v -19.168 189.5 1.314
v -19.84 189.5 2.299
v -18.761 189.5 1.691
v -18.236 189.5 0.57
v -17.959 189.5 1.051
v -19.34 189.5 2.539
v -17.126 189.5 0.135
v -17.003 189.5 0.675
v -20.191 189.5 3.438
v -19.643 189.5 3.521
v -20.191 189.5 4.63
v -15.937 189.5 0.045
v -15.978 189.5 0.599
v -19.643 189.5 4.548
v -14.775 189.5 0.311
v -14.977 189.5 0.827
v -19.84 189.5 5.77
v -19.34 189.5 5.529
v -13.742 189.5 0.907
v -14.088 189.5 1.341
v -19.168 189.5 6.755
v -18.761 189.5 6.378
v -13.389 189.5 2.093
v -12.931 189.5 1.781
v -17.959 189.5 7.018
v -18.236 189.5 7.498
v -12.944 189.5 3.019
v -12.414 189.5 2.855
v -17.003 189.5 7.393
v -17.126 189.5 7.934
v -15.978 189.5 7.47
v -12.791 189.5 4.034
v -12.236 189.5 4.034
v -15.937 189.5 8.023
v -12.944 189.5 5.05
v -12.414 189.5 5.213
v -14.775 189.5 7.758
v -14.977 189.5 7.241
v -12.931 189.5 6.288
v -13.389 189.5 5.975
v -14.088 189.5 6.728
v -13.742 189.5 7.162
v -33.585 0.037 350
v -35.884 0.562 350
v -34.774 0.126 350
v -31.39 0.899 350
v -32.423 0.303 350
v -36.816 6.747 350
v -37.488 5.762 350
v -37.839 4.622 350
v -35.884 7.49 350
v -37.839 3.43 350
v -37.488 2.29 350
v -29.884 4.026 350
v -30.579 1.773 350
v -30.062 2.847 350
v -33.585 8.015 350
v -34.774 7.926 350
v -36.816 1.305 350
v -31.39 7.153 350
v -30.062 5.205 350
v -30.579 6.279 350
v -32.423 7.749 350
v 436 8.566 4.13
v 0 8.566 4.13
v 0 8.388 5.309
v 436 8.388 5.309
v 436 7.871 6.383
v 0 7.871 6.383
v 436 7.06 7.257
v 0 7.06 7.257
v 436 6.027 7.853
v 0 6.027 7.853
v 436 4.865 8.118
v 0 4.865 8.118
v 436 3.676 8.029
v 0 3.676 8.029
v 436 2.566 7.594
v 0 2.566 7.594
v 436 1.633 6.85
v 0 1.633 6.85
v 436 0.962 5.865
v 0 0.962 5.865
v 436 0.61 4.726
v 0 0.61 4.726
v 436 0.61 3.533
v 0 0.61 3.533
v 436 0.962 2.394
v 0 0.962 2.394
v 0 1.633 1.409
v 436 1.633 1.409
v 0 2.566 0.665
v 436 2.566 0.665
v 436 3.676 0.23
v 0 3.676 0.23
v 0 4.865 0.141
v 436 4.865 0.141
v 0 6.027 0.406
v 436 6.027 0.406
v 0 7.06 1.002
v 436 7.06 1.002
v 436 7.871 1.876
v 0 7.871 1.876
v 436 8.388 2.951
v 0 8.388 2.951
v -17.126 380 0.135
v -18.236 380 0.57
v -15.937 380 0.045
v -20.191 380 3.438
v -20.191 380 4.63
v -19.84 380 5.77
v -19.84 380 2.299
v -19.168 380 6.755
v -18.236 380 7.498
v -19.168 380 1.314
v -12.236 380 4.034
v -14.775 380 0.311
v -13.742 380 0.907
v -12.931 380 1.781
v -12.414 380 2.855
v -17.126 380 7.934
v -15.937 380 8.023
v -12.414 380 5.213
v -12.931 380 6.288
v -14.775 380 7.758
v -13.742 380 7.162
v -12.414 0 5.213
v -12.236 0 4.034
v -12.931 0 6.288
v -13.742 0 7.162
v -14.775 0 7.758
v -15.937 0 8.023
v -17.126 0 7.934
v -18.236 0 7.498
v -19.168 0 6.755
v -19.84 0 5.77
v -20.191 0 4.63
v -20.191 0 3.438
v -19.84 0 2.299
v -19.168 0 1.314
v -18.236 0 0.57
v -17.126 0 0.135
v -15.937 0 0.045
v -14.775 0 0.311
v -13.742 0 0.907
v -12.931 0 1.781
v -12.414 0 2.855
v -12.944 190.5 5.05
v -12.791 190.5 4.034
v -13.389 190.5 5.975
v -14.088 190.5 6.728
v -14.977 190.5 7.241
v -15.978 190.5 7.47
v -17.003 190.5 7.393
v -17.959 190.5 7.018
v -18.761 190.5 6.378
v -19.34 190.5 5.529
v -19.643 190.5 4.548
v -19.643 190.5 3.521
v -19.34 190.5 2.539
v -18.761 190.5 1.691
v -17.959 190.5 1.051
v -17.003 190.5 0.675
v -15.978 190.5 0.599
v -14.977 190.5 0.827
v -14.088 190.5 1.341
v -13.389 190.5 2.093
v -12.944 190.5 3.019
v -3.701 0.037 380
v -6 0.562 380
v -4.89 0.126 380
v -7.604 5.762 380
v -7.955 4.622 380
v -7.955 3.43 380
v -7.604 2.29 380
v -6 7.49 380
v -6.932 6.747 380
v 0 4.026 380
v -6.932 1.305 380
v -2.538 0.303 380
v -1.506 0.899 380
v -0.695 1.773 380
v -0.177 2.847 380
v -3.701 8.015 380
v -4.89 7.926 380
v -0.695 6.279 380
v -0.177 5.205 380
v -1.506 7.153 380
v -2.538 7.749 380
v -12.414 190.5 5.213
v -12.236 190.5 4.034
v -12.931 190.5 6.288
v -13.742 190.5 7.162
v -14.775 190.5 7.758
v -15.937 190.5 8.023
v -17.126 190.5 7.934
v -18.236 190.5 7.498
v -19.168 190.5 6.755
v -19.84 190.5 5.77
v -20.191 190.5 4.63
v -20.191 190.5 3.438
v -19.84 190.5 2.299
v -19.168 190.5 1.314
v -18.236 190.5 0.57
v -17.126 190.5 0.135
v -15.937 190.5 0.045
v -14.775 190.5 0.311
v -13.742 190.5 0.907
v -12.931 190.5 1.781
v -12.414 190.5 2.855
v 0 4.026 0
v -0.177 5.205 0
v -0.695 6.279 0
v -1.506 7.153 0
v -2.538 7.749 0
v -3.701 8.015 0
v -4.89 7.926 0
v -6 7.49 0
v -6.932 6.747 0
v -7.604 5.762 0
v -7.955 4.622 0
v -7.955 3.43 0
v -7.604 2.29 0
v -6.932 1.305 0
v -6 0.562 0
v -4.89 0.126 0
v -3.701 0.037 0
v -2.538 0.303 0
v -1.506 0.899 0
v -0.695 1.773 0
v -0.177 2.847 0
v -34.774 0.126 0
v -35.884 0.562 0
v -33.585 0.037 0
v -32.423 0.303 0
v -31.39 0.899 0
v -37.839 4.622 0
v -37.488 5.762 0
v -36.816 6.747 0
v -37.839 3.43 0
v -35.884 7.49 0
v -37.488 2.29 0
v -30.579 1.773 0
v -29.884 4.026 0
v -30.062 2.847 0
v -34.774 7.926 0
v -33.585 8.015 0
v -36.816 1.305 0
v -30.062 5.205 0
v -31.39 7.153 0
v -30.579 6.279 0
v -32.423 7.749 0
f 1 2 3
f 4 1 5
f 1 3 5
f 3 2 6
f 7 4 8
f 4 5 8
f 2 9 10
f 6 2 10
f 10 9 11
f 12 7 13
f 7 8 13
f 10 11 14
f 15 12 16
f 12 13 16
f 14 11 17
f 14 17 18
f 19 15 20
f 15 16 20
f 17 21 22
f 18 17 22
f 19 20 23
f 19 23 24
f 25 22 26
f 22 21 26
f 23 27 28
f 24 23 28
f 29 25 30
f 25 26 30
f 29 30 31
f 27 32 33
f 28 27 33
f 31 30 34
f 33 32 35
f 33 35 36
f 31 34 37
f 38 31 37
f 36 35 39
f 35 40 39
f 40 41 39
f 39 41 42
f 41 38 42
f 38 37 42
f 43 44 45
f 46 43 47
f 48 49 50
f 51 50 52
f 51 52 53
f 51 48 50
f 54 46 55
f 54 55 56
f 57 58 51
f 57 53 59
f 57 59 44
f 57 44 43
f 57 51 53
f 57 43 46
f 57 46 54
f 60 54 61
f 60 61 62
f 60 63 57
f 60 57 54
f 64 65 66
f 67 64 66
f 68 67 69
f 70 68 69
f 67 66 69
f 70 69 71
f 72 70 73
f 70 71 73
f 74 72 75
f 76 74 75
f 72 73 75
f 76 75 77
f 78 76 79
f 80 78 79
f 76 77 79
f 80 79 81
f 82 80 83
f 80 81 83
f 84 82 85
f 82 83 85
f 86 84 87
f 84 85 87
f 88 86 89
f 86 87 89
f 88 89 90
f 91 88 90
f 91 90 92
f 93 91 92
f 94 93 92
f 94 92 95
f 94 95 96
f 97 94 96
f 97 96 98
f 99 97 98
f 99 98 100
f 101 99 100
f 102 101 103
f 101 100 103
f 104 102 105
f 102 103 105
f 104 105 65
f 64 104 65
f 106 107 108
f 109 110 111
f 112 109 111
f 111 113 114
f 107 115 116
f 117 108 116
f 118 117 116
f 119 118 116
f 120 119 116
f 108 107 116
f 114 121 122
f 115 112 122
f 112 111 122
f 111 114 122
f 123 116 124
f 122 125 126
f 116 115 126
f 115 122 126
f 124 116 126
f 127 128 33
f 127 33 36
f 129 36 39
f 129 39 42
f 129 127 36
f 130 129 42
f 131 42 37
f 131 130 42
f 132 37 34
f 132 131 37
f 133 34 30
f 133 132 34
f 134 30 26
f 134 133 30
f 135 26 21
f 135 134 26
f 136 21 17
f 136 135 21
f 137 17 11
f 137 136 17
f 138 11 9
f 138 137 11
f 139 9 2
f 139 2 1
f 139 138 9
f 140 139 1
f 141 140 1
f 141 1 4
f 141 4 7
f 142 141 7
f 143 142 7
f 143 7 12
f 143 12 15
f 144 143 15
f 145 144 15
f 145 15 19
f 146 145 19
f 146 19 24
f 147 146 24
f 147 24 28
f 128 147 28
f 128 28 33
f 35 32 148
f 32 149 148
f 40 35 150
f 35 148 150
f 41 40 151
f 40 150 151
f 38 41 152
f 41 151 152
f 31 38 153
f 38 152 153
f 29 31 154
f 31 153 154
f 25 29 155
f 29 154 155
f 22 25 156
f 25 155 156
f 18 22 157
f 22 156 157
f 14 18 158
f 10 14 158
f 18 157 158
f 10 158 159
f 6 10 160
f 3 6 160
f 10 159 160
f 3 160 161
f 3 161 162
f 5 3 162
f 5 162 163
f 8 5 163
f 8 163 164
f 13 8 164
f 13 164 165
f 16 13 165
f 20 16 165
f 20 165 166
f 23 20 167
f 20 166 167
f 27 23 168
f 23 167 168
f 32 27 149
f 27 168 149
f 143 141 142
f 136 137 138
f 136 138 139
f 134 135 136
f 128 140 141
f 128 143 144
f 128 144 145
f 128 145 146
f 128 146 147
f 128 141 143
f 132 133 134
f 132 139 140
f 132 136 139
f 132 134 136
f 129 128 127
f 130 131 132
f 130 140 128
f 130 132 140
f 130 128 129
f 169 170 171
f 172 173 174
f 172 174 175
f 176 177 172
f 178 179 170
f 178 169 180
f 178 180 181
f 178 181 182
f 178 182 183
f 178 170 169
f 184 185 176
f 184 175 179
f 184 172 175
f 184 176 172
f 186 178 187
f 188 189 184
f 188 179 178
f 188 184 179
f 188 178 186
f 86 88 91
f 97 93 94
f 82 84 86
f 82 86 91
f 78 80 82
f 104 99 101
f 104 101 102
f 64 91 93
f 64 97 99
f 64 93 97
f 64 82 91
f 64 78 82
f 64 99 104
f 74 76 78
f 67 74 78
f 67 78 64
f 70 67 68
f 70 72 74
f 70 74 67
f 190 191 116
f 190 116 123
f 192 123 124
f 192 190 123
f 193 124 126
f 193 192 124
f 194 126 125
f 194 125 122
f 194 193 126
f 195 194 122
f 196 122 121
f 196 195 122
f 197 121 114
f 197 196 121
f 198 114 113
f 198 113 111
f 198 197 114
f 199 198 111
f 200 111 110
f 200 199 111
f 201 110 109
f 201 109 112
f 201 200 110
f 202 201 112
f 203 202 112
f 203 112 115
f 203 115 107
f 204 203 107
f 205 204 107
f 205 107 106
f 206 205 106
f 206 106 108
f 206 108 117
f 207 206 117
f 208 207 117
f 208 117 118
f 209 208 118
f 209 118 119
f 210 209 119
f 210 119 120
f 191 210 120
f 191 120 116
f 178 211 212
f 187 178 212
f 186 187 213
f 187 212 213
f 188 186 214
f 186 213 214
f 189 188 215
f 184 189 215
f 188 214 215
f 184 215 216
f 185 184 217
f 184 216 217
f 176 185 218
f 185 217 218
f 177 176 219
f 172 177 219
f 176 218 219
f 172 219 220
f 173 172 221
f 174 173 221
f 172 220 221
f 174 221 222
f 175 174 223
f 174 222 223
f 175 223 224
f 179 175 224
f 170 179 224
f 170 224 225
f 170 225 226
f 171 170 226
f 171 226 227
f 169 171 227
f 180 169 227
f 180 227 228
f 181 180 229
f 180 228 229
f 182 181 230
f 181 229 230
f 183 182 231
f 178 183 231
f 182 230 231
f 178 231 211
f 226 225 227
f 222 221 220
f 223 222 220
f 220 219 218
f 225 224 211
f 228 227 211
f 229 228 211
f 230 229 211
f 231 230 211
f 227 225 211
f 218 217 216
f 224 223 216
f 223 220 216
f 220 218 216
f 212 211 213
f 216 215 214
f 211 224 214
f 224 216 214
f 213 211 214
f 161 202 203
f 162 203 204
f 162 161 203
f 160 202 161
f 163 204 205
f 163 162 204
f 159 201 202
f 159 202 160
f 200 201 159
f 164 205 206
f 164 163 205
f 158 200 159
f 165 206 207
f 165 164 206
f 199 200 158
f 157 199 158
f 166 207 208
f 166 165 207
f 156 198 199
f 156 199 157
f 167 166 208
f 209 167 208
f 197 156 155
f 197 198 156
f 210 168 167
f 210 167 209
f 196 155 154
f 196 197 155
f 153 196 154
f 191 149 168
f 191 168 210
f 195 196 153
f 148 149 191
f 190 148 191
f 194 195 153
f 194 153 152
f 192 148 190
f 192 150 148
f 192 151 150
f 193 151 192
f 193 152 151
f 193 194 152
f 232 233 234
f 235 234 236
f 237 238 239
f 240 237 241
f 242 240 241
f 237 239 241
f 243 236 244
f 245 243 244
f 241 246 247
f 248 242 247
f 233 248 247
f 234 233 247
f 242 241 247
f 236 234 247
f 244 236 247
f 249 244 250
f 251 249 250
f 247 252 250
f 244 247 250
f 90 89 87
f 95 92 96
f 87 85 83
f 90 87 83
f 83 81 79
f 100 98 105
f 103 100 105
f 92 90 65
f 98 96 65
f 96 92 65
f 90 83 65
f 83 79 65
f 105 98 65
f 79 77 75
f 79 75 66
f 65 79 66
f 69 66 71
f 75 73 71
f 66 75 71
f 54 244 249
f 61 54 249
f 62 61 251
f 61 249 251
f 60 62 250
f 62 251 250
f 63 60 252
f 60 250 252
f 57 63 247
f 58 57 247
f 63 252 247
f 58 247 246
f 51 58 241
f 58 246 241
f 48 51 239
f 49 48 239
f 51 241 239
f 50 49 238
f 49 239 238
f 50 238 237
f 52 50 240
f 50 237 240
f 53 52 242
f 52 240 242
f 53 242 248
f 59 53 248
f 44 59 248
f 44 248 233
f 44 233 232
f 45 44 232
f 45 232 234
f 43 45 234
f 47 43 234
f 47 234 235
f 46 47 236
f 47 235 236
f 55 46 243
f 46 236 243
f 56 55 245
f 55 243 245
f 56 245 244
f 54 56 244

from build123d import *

# Parameters (mm, degrees)
F0_R     = 4
F1_DEPTH = 380
F2_R     = 4
F3_DEPTH = 380
F4_R     = 4
F5_DEPTH = 436
F6_DEPTH = 350
F8_R     = 4
F8_R_2   = 3.4452570005
F9_DEPTH = 0.5


with BuildPart() as f1:
    # F0 (on Top) → F1 (new body)
    with BuildSketch(Plane.XY):
        with Locations((-3.9996842142, 4.0259968746)):
            Circle(F0_R)
    extrude(amount=F1_DEPTH)


with BuildPart() as f3:
    # F2 (on Front) → F3 (new body)
    with BuildSketch(Plane.XZ):
        with Locations((-16.2359386162, 4.0342601048)):
            Circle(F2_R)
    extrude(amount=-F3_DEPTH)

    # F8 (on offset) → F9 (cut, symmetric)
    with BuildSketch(Plane.XZ.offset(-190)):
        with Locations((-16.2359386162, 4.0342601048)):
            Circle(F8_R)
        with Locations((-16.2359386162, 4.0342601048)):
            Circle(F8_R_2, mode=Mode.SUBTRACT)
    extrude(amount=F9_DEPTH, both=True, mode=Mode.SUBTRACT)


with BuildPart() as f5:
    # F4 (on Right) → F5 (new body)
    with BuildSketch(Plane.YZ):
        with Locations((4.5656003058, 4.1295401752)):
            Circle(F4_R)
    extrude(amount=F5_DEPTH)


with BuildPart() as f6:
    # F0 (on Top) → F6 (new body)
    with BuildSketch(Plane.XY):
        with Locations((-33.8839329779, 4.0259968746)):
            Circle(F0_R)
    extrude(amount=F6_DEPTH)


solid = Compound([f1.part, f3.part, f5.part, f6.part])
